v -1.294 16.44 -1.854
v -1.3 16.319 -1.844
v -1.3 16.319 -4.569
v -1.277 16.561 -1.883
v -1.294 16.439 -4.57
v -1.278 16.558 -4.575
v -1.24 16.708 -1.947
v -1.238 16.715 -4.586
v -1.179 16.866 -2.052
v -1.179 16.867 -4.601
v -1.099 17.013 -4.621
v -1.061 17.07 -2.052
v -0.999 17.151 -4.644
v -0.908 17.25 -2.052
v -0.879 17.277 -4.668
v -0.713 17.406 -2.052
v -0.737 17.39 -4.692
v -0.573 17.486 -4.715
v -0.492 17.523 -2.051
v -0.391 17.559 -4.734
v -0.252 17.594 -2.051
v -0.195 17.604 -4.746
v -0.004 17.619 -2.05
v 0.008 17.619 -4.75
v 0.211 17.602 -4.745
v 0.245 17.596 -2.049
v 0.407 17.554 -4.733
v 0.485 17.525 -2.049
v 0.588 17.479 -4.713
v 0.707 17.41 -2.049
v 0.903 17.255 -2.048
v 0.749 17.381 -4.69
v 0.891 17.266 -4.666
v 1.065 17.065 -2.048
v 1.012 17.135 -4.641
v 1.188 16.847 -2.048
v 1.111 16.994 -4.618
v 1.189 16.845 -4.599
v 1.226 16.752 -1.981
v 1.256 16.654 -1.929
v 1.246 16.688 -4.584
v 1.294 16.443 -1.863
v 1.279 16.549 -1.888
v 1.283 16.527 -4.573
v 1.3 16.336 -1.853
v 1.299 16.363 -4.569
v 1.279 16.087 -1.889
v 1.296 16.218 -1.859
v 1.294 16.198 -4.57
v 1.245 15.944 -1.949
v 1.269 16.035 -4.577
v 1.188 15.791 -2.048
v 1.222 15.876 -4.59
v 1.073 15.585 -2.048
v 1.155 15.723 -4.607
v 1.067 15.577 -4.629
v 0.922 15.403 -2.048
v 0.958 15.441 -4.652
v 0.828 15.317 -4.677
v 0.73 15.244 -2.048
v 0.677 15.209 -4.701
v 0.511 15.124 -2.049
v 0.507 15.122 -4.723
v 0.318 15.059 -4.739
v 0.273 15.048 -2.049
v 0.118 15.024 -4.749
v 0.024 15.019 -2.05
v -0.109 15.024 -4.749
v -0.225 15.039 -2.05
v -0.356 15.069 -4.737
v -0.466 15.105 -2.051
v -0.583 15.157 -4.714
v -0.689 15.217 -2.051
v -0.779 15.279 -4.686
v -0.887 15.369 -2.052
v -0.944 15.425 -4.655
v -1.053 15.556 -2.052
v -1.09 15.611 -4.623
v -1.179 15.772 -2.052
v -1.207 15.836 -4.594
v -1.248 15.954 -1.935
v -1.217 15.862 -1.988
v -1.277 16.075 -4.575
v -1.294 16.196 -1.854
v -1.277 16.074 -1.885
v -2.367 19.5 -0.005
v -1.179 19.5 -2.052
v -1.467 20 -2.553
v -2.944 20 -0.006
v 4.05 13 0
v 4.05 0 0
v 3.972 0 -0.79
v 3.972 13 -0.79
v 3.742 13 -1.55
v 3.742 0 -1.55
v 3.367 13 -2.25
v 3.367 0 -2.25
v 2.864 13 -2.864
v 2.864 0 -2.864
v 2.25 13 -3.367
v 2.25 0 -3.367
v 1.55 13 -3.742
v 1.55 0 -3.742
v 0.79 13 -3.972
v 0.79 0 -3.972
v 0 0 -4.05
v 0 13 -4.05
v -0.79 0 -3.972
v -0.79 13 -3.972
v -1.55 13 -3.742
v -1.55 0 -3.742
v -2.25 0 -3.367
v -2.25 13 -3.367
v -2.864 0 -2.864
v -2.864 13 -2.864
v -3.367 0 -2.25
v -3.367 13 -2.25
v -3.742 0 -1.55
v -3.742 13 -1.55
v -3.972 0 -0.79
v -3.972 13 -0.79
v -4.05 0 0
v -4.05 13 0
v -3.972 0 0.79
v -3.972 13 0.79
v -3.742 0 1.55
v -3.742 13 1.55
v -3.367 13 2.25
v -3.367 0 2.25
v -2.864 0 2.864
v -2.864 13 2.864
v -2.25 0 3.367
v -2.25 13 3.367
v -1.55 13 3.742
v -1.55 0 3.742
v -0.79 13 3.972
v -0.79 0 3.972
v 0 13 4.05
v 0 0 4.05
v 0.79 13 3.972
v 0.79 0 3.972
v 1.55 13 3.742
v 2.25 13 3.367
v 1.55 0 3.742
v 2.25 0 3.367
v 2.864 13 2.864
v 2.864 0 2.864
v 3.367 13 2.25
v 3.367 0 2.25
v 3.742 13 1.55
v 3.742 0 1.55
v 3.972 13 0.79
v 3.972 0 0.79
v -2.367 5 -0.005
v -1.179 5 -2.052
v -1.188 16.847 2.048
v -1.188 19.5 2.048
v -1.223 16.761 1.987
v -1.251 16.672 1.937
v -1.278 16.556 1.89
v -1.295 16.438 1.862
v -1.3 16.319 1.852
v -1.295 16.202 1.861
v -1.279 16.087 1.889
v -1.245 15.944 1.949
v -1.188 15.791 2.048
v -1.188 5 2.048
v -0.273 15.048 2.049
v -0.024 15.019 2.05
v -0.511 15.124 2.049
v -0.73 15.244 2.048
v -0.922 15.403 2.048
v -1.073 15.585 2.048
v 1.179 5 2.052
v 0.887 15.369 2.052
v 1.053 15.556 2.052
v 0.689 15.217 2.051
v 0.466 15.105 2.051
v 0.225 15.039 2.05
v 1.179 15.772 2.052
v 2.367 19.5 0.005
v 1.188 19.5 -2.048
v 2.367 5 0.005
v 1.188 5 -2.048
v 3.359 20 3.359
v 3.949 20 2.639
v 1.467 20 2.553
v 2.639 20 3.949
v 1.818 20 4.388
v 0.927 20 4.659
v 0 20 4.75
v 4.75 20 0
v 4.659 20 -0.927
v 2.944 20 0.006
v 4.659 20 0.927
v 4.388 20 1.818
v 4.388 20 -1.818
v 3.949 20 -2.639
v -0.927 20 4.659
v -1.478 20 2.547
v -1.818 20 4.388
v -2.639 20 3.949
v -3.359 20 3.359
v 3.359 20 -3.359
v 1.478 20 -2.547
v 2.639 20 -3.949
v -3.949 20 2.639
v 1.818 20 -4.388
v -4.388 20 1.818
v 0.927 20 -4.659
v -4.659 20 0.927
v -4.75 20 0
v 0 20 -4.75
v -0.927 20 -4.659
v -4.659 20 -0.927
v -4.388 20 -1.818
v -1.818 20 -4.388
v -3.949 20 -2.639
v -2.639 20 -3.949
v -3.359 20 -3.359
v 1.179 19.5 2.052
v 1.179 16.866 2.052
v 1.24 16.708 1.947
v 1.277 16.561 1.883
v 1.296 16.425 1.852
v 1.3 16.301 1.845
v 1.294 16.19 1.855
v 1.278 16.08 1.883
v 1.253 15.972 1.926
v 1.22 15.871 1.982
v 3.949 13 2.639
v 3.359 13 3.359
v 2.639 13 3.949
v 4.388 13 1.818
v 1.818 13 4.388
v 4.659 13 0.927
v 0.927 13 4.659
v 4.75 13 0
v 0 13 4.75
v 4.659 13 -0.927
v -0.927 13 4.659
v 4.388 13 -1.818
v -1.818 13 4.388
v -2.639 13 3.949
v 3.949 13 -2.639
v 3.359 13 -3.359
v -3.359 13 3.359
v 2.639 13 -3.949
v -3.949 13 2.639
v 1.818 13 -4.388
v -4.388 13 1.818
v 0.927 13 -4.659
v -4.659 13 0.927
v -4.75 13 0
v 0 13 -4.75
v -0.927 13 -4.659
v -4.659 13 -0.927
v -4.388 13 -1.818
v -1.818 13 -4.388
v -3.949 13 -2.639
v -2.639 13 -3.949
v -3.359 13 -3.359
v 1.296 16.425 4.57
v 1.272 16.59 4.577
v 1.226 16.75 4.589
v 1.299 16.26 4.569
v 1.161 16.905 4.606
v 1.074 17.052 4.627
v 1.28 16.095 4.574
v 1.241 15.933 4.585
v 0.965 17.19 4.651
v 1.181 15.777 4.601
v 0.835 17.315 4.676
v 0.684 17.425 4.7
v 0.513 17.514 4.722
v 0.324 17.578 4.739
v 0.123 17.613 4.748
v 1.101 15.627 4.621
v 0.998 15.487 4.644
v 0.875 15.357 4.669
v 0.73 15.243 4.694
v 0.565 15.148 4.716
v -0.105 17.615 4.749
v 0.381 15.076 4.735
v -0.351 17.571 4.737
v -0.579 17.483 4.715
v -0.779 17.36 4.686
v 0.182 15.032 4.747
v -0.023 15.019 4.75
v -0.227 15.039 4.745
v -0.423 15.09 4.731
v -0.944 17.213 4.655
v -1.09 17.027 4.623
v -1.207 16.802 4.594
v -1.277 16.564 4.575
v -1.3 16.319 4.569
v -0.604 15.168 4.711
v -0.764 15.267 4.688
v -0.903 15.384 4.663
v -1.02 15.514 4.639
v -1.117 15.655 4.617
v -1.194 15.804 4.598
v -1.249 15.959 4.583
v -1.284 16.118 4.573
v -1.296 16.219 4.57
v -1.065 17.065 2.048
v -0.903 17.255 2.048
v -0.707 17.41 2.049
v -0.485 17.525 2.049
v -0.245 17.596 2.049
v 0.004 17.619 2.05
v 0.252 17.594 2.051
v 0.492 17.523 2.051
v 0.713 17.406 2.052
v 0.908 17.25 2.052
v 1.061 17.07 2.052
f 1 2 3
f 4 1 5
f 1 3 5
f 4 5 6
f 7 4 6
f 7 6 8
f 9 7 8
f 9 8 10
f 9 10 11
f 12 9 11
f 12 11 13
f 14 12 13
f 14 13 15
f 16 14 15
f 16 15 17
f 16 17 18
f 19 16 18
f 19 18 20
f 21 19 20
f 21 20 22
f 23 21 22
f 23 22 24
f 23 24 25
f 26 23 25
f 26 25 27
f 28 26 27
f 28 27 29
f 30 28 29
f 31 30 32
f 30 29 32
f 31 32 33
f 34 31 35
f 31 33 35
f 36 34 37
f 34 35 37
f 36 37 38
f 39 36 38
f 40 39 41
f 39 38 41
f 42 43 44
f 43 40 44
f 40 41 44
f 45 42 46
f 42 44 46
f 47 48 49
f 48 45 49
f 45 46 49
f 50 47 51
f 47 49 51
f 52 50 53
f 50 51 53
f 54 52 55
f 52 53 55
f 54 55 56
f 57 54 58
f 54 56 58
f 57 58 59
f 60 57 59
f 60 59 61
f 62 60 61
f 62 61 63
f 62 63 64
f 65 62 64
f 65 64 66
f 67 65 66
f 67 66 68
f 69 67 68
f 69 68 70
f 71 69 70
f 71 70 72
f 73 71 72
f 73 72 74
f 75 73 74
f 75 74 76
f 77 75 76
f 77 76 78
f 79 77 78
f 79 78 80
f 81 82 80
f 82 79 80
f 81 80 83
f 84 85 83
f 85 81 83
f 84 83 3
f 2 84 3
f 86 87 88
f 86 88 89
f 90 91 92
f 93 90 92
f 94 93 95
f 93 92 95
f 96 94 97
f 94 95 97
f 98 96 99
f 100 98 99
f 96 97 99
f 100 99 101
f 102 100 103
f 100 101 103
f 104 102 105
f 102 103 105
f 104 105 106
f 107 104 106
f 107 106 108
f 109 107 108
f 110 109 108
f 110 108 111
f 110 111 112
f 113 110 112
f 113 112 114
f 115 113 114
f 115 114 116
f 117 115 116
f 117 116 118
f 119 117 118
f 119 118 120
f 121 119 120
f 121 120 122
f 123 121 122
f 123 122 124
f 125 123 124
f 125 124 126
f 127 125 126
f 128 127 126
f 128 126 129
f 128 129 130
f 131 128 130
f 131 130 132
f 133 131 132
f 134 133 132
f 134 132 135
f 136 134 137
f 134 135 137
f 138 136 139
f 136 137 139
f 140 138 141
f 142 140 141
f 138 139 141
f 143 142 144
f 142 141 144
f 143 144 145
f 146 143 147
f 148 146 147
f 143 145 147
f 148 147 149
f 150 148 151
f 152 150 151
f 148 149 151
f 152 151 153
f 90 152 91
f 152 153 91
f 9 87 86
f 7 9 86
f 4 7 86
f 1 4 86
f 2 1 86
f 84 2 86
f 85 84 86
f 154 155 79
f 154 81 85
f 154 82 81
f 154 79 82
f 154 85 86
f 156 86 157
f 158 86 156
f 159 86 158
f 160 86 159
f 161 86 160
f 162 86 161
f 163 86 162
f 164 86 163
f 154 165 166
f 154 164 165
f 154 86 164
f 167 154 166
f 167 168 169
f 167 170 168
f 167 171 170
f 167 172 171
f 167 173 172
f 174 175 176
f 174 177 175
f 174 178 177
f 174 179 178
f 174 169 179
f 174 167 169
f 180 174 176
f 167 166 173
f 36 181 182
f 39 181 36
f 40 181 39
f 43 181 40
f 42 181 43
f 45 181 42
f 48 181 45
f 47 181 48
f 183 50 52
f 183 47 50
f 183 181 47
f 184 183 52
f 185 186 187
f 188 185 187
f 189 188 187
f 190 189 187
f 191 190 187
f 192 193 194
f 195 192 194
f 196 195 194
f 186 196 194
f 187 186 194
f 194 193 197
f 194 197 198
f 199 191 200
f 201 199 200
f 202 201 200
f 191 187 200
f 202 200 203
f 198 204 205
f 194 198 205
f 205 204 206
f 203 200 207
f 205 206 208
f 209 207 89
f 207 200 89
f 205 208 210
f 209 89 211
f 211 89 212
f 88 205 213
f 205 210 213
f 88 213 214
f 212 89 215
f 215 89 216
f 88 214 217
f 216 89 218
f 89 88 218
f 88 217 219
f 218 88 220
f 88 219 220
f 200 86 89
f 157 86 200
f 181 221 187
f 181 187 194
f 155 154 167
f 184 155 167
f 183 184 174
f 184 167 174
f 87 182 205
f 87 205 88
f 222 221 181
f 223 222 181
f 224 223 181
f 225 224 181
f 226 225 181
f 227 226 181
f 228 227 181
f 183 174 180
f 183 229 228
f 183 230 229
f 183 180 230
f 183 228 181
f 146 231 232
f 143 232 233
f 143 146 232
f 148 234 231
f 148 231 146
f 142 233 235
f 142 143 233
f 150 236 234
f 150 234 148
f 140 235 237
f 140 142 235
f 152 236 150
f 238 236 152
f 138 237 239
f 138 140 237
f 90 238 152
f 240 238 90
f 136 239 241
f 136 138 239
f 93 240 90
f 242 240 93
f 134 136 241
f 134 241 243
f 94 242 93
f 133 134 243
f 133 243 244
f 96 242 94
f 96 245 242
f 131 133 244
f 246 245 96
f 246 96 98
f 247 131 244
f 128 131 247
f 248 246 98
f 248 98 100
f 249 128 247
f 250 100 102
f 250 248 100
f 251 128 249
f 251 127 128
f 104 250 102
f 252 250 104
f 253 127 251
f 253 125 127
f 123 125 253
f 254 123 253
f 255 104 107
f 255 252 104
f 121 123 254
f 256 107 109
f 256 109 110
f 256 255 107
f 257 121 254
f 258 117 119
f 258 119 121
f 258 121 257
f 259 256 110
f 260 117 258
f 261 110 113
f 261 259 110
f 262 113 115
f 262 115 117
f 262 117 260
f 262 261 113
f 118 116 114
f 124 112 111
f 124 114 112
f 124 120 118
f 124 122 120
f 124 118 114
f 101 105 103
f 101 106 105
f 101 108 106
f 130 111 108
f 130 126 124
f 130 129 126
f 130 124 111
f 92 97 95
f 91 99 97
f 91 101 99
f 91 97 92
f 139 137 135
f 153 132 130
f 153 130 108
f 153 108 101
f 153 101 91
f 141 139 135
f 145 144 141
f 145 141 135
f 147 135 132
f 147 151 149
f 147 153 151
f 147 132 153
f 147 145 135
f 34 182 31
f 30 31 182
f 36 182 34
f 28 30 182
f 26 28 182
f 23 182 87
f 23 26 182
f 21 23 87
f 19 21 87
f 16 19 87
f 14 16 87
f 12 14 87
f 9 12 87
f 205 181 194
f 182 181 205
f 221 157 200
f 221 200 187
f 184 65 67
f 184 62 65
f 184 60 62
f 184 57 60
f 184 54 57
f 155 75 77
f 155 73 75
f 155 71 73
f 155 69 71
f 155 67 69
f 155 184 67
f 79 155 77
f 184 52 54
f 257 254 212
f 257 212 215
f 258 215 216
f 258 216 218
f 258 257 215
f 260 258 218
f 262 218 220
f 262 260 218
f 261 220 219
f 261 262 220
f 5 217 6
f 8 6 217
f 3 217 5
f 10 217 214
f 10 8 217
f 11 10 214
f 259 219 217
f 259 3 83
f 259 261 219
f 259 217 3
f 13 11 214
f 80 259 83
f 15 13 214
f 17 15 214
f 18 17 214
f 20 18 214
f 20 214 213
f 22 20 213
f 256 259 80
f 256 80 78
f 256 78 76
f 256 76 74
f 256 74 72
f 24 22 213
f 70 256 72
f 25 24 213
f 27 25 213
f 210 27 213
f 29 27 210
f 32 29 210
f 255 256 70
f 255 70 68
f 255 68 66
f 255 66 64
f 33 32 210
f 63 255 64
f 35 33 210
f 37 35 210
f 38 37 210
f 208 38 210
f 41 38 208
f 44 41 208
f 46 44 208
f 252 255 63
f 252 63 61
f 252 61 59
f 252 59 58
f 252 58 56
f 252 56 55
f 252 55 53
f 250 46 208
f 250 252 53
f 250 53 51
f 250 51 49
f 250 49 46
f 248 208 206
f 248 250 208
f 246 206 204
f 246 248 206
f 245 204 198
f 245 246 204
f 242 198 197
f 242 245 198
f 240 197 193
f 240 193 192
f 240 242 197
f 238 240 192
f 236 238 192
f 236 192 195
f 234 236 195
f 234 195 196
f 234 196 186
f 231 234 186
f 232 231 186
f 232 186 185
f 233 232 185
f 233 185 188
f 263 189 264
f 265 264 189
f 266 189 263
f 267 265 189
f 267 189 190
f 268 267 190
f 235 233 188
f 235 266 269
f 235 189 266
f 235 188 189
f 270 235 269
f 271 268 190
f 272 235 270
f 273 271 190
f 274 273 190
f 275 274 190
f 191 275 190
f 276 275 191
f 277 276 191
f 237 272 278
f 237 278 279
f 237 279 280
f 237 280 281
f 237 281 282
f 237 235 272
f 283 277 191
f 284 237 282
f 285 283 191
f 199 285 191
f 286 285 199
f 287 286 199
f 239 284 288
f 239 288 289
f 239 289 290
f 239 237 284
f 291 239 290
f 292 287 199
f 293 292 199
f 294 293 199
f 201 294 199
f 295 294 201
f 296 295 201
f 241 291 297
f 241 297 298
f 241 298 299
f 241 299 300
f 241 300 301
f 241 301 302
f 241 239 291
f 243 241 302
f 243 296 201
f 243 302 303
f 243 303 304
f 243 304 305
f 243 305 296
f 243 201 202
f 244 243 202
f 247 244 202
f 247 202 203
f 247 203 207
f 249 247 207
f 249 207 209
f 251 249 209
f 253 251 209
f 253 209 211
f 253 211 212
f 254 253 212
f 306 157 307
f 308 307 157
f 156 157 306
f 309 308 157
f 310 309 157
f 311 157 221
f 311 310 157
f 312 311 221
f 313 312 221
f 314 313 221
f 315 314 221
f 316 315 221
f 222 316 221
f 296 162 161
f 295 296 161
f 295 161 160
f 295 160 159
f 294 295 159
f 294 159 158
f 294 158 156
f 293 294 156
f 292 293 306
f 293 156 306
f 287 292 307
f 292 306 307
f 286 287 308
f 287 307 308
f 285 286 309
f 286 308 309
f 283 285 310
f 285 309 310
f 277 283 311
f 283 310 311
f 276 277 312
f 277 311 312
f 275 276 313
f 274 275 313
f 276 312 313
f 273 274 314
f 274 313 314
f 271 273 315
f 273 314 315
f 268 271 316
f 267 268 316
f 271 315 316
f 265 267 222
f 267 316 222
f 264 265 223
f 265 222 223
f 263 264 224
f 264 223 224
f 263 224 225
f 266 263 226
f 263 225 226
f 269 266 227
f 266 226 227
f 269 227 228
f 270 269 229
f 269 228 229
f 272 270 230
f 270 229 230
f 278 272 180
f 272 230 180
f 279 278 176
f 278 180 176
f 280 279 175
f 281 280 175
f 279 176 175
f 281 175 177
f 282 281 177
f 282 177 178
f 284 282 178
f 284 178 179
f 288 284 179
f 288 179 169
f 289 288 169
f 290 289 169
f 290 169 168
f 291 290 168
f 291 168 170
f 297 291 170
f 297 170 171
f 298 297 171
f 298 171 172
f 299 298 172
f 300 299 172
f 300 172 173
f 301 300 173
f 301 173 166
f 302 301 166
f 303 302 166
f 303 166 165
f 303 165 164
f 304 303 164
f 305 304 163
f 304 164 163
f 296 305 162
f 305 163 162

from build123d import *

# Parameters (mm, degrees)
SKETCH1_R           = 4.05
BOSS_EXTRUDE1_DEPTH = 20
BOSS_EXTRUDE2_DEPTH = 5
SKETCH3_R           = 4.75
SKETCH3_R_2         = 4.05
BOSS_EXTRUDE3_DEPTH = 7
CHAMFER1_SIZE       = 0.5
SKETCH4_R           = 1.3
CUT_EXTRUDE1_DEPTH  = 10.5


with BuildPart() as part:
    # Sketch1 → Boss-Extrude1 (new body)
    with BuildSketch(Plane(origin=(0, 0, 0), x_dir=(1, 0, 0), z_dir=(0, 1, 0))):
        Circle(SKETCH1_R)
        Polygon((1.187868906, 2.047510878), (-1.179261982, 2.052480088), (-2.367130888, 0.00496921), (-1.187868906, -2.047510878), (1.179261982, -2.052480088), (2.367130888, -0.00496921), align=None, mode=Mode.SUBTRACT)
    extrude(amount=BOSS_EXTRUDE1_DEPTH)

    # Sketch2 → Boss-Extrude2 (add)
    with BuildSketch(Plane.XZ):
        Polygon((1.187868906, -2.047510878), (2.367130888, 0.00496921), (1.179261982, 2.052480088), (-1.187868906, 2.047510878), (-2.367130888, -0.00496921), (-1.179261982, -2.052480088), align=None)
    extrude(amount=-BOSS_EXTRUDE2_DEPTH)

    # Sketch3 → Boss-Extrude3 (add)
    with BuildSketch(Plane(origin=(0, 13, 0), x_dir=(-1, 0, 0), z_dir=(0, -1, 0))):
        Circle(SKETCH3_R)
        Circle(SKETCH3_R_2, mode=Mode.SUBTRACT)
    extrude(amount=-BOSS_EXTRUDE3_DEPTH)

    # Chamfer1
    chamfer1_edges = [part.edges().sort_by_distance(p)[0] for p in [
        (1.777499897, 20, -1.021270834),
        (0.004303462, 20, -2.049995483),
        (-1.773196435, 20, -1.028724649),
        (-1.777499897, 20, 1.021270834),
        (-0.004303462, 20, 2.049995483),
        (1.773196435, 20, 1.028724649),
    ]]
    chamfer(chamfer1_edges, length=CHAMFER1_SIZE)

    # Sketch4 → Cut-Extrude1 (cut, through all)
    with BuildSketch(Plane(origin=(0, 0, -4.75), x_dir=(-1, 0, 0), z_dir=(0, 0, -1))):
        with Locations((0, 16.319152566)):
            Circle(SKETCH4_R)
    extrude(amount=-CUT_EXTRUDE1_DEPTH, mode=Mode.SUBTRACT)


solid = part.part
